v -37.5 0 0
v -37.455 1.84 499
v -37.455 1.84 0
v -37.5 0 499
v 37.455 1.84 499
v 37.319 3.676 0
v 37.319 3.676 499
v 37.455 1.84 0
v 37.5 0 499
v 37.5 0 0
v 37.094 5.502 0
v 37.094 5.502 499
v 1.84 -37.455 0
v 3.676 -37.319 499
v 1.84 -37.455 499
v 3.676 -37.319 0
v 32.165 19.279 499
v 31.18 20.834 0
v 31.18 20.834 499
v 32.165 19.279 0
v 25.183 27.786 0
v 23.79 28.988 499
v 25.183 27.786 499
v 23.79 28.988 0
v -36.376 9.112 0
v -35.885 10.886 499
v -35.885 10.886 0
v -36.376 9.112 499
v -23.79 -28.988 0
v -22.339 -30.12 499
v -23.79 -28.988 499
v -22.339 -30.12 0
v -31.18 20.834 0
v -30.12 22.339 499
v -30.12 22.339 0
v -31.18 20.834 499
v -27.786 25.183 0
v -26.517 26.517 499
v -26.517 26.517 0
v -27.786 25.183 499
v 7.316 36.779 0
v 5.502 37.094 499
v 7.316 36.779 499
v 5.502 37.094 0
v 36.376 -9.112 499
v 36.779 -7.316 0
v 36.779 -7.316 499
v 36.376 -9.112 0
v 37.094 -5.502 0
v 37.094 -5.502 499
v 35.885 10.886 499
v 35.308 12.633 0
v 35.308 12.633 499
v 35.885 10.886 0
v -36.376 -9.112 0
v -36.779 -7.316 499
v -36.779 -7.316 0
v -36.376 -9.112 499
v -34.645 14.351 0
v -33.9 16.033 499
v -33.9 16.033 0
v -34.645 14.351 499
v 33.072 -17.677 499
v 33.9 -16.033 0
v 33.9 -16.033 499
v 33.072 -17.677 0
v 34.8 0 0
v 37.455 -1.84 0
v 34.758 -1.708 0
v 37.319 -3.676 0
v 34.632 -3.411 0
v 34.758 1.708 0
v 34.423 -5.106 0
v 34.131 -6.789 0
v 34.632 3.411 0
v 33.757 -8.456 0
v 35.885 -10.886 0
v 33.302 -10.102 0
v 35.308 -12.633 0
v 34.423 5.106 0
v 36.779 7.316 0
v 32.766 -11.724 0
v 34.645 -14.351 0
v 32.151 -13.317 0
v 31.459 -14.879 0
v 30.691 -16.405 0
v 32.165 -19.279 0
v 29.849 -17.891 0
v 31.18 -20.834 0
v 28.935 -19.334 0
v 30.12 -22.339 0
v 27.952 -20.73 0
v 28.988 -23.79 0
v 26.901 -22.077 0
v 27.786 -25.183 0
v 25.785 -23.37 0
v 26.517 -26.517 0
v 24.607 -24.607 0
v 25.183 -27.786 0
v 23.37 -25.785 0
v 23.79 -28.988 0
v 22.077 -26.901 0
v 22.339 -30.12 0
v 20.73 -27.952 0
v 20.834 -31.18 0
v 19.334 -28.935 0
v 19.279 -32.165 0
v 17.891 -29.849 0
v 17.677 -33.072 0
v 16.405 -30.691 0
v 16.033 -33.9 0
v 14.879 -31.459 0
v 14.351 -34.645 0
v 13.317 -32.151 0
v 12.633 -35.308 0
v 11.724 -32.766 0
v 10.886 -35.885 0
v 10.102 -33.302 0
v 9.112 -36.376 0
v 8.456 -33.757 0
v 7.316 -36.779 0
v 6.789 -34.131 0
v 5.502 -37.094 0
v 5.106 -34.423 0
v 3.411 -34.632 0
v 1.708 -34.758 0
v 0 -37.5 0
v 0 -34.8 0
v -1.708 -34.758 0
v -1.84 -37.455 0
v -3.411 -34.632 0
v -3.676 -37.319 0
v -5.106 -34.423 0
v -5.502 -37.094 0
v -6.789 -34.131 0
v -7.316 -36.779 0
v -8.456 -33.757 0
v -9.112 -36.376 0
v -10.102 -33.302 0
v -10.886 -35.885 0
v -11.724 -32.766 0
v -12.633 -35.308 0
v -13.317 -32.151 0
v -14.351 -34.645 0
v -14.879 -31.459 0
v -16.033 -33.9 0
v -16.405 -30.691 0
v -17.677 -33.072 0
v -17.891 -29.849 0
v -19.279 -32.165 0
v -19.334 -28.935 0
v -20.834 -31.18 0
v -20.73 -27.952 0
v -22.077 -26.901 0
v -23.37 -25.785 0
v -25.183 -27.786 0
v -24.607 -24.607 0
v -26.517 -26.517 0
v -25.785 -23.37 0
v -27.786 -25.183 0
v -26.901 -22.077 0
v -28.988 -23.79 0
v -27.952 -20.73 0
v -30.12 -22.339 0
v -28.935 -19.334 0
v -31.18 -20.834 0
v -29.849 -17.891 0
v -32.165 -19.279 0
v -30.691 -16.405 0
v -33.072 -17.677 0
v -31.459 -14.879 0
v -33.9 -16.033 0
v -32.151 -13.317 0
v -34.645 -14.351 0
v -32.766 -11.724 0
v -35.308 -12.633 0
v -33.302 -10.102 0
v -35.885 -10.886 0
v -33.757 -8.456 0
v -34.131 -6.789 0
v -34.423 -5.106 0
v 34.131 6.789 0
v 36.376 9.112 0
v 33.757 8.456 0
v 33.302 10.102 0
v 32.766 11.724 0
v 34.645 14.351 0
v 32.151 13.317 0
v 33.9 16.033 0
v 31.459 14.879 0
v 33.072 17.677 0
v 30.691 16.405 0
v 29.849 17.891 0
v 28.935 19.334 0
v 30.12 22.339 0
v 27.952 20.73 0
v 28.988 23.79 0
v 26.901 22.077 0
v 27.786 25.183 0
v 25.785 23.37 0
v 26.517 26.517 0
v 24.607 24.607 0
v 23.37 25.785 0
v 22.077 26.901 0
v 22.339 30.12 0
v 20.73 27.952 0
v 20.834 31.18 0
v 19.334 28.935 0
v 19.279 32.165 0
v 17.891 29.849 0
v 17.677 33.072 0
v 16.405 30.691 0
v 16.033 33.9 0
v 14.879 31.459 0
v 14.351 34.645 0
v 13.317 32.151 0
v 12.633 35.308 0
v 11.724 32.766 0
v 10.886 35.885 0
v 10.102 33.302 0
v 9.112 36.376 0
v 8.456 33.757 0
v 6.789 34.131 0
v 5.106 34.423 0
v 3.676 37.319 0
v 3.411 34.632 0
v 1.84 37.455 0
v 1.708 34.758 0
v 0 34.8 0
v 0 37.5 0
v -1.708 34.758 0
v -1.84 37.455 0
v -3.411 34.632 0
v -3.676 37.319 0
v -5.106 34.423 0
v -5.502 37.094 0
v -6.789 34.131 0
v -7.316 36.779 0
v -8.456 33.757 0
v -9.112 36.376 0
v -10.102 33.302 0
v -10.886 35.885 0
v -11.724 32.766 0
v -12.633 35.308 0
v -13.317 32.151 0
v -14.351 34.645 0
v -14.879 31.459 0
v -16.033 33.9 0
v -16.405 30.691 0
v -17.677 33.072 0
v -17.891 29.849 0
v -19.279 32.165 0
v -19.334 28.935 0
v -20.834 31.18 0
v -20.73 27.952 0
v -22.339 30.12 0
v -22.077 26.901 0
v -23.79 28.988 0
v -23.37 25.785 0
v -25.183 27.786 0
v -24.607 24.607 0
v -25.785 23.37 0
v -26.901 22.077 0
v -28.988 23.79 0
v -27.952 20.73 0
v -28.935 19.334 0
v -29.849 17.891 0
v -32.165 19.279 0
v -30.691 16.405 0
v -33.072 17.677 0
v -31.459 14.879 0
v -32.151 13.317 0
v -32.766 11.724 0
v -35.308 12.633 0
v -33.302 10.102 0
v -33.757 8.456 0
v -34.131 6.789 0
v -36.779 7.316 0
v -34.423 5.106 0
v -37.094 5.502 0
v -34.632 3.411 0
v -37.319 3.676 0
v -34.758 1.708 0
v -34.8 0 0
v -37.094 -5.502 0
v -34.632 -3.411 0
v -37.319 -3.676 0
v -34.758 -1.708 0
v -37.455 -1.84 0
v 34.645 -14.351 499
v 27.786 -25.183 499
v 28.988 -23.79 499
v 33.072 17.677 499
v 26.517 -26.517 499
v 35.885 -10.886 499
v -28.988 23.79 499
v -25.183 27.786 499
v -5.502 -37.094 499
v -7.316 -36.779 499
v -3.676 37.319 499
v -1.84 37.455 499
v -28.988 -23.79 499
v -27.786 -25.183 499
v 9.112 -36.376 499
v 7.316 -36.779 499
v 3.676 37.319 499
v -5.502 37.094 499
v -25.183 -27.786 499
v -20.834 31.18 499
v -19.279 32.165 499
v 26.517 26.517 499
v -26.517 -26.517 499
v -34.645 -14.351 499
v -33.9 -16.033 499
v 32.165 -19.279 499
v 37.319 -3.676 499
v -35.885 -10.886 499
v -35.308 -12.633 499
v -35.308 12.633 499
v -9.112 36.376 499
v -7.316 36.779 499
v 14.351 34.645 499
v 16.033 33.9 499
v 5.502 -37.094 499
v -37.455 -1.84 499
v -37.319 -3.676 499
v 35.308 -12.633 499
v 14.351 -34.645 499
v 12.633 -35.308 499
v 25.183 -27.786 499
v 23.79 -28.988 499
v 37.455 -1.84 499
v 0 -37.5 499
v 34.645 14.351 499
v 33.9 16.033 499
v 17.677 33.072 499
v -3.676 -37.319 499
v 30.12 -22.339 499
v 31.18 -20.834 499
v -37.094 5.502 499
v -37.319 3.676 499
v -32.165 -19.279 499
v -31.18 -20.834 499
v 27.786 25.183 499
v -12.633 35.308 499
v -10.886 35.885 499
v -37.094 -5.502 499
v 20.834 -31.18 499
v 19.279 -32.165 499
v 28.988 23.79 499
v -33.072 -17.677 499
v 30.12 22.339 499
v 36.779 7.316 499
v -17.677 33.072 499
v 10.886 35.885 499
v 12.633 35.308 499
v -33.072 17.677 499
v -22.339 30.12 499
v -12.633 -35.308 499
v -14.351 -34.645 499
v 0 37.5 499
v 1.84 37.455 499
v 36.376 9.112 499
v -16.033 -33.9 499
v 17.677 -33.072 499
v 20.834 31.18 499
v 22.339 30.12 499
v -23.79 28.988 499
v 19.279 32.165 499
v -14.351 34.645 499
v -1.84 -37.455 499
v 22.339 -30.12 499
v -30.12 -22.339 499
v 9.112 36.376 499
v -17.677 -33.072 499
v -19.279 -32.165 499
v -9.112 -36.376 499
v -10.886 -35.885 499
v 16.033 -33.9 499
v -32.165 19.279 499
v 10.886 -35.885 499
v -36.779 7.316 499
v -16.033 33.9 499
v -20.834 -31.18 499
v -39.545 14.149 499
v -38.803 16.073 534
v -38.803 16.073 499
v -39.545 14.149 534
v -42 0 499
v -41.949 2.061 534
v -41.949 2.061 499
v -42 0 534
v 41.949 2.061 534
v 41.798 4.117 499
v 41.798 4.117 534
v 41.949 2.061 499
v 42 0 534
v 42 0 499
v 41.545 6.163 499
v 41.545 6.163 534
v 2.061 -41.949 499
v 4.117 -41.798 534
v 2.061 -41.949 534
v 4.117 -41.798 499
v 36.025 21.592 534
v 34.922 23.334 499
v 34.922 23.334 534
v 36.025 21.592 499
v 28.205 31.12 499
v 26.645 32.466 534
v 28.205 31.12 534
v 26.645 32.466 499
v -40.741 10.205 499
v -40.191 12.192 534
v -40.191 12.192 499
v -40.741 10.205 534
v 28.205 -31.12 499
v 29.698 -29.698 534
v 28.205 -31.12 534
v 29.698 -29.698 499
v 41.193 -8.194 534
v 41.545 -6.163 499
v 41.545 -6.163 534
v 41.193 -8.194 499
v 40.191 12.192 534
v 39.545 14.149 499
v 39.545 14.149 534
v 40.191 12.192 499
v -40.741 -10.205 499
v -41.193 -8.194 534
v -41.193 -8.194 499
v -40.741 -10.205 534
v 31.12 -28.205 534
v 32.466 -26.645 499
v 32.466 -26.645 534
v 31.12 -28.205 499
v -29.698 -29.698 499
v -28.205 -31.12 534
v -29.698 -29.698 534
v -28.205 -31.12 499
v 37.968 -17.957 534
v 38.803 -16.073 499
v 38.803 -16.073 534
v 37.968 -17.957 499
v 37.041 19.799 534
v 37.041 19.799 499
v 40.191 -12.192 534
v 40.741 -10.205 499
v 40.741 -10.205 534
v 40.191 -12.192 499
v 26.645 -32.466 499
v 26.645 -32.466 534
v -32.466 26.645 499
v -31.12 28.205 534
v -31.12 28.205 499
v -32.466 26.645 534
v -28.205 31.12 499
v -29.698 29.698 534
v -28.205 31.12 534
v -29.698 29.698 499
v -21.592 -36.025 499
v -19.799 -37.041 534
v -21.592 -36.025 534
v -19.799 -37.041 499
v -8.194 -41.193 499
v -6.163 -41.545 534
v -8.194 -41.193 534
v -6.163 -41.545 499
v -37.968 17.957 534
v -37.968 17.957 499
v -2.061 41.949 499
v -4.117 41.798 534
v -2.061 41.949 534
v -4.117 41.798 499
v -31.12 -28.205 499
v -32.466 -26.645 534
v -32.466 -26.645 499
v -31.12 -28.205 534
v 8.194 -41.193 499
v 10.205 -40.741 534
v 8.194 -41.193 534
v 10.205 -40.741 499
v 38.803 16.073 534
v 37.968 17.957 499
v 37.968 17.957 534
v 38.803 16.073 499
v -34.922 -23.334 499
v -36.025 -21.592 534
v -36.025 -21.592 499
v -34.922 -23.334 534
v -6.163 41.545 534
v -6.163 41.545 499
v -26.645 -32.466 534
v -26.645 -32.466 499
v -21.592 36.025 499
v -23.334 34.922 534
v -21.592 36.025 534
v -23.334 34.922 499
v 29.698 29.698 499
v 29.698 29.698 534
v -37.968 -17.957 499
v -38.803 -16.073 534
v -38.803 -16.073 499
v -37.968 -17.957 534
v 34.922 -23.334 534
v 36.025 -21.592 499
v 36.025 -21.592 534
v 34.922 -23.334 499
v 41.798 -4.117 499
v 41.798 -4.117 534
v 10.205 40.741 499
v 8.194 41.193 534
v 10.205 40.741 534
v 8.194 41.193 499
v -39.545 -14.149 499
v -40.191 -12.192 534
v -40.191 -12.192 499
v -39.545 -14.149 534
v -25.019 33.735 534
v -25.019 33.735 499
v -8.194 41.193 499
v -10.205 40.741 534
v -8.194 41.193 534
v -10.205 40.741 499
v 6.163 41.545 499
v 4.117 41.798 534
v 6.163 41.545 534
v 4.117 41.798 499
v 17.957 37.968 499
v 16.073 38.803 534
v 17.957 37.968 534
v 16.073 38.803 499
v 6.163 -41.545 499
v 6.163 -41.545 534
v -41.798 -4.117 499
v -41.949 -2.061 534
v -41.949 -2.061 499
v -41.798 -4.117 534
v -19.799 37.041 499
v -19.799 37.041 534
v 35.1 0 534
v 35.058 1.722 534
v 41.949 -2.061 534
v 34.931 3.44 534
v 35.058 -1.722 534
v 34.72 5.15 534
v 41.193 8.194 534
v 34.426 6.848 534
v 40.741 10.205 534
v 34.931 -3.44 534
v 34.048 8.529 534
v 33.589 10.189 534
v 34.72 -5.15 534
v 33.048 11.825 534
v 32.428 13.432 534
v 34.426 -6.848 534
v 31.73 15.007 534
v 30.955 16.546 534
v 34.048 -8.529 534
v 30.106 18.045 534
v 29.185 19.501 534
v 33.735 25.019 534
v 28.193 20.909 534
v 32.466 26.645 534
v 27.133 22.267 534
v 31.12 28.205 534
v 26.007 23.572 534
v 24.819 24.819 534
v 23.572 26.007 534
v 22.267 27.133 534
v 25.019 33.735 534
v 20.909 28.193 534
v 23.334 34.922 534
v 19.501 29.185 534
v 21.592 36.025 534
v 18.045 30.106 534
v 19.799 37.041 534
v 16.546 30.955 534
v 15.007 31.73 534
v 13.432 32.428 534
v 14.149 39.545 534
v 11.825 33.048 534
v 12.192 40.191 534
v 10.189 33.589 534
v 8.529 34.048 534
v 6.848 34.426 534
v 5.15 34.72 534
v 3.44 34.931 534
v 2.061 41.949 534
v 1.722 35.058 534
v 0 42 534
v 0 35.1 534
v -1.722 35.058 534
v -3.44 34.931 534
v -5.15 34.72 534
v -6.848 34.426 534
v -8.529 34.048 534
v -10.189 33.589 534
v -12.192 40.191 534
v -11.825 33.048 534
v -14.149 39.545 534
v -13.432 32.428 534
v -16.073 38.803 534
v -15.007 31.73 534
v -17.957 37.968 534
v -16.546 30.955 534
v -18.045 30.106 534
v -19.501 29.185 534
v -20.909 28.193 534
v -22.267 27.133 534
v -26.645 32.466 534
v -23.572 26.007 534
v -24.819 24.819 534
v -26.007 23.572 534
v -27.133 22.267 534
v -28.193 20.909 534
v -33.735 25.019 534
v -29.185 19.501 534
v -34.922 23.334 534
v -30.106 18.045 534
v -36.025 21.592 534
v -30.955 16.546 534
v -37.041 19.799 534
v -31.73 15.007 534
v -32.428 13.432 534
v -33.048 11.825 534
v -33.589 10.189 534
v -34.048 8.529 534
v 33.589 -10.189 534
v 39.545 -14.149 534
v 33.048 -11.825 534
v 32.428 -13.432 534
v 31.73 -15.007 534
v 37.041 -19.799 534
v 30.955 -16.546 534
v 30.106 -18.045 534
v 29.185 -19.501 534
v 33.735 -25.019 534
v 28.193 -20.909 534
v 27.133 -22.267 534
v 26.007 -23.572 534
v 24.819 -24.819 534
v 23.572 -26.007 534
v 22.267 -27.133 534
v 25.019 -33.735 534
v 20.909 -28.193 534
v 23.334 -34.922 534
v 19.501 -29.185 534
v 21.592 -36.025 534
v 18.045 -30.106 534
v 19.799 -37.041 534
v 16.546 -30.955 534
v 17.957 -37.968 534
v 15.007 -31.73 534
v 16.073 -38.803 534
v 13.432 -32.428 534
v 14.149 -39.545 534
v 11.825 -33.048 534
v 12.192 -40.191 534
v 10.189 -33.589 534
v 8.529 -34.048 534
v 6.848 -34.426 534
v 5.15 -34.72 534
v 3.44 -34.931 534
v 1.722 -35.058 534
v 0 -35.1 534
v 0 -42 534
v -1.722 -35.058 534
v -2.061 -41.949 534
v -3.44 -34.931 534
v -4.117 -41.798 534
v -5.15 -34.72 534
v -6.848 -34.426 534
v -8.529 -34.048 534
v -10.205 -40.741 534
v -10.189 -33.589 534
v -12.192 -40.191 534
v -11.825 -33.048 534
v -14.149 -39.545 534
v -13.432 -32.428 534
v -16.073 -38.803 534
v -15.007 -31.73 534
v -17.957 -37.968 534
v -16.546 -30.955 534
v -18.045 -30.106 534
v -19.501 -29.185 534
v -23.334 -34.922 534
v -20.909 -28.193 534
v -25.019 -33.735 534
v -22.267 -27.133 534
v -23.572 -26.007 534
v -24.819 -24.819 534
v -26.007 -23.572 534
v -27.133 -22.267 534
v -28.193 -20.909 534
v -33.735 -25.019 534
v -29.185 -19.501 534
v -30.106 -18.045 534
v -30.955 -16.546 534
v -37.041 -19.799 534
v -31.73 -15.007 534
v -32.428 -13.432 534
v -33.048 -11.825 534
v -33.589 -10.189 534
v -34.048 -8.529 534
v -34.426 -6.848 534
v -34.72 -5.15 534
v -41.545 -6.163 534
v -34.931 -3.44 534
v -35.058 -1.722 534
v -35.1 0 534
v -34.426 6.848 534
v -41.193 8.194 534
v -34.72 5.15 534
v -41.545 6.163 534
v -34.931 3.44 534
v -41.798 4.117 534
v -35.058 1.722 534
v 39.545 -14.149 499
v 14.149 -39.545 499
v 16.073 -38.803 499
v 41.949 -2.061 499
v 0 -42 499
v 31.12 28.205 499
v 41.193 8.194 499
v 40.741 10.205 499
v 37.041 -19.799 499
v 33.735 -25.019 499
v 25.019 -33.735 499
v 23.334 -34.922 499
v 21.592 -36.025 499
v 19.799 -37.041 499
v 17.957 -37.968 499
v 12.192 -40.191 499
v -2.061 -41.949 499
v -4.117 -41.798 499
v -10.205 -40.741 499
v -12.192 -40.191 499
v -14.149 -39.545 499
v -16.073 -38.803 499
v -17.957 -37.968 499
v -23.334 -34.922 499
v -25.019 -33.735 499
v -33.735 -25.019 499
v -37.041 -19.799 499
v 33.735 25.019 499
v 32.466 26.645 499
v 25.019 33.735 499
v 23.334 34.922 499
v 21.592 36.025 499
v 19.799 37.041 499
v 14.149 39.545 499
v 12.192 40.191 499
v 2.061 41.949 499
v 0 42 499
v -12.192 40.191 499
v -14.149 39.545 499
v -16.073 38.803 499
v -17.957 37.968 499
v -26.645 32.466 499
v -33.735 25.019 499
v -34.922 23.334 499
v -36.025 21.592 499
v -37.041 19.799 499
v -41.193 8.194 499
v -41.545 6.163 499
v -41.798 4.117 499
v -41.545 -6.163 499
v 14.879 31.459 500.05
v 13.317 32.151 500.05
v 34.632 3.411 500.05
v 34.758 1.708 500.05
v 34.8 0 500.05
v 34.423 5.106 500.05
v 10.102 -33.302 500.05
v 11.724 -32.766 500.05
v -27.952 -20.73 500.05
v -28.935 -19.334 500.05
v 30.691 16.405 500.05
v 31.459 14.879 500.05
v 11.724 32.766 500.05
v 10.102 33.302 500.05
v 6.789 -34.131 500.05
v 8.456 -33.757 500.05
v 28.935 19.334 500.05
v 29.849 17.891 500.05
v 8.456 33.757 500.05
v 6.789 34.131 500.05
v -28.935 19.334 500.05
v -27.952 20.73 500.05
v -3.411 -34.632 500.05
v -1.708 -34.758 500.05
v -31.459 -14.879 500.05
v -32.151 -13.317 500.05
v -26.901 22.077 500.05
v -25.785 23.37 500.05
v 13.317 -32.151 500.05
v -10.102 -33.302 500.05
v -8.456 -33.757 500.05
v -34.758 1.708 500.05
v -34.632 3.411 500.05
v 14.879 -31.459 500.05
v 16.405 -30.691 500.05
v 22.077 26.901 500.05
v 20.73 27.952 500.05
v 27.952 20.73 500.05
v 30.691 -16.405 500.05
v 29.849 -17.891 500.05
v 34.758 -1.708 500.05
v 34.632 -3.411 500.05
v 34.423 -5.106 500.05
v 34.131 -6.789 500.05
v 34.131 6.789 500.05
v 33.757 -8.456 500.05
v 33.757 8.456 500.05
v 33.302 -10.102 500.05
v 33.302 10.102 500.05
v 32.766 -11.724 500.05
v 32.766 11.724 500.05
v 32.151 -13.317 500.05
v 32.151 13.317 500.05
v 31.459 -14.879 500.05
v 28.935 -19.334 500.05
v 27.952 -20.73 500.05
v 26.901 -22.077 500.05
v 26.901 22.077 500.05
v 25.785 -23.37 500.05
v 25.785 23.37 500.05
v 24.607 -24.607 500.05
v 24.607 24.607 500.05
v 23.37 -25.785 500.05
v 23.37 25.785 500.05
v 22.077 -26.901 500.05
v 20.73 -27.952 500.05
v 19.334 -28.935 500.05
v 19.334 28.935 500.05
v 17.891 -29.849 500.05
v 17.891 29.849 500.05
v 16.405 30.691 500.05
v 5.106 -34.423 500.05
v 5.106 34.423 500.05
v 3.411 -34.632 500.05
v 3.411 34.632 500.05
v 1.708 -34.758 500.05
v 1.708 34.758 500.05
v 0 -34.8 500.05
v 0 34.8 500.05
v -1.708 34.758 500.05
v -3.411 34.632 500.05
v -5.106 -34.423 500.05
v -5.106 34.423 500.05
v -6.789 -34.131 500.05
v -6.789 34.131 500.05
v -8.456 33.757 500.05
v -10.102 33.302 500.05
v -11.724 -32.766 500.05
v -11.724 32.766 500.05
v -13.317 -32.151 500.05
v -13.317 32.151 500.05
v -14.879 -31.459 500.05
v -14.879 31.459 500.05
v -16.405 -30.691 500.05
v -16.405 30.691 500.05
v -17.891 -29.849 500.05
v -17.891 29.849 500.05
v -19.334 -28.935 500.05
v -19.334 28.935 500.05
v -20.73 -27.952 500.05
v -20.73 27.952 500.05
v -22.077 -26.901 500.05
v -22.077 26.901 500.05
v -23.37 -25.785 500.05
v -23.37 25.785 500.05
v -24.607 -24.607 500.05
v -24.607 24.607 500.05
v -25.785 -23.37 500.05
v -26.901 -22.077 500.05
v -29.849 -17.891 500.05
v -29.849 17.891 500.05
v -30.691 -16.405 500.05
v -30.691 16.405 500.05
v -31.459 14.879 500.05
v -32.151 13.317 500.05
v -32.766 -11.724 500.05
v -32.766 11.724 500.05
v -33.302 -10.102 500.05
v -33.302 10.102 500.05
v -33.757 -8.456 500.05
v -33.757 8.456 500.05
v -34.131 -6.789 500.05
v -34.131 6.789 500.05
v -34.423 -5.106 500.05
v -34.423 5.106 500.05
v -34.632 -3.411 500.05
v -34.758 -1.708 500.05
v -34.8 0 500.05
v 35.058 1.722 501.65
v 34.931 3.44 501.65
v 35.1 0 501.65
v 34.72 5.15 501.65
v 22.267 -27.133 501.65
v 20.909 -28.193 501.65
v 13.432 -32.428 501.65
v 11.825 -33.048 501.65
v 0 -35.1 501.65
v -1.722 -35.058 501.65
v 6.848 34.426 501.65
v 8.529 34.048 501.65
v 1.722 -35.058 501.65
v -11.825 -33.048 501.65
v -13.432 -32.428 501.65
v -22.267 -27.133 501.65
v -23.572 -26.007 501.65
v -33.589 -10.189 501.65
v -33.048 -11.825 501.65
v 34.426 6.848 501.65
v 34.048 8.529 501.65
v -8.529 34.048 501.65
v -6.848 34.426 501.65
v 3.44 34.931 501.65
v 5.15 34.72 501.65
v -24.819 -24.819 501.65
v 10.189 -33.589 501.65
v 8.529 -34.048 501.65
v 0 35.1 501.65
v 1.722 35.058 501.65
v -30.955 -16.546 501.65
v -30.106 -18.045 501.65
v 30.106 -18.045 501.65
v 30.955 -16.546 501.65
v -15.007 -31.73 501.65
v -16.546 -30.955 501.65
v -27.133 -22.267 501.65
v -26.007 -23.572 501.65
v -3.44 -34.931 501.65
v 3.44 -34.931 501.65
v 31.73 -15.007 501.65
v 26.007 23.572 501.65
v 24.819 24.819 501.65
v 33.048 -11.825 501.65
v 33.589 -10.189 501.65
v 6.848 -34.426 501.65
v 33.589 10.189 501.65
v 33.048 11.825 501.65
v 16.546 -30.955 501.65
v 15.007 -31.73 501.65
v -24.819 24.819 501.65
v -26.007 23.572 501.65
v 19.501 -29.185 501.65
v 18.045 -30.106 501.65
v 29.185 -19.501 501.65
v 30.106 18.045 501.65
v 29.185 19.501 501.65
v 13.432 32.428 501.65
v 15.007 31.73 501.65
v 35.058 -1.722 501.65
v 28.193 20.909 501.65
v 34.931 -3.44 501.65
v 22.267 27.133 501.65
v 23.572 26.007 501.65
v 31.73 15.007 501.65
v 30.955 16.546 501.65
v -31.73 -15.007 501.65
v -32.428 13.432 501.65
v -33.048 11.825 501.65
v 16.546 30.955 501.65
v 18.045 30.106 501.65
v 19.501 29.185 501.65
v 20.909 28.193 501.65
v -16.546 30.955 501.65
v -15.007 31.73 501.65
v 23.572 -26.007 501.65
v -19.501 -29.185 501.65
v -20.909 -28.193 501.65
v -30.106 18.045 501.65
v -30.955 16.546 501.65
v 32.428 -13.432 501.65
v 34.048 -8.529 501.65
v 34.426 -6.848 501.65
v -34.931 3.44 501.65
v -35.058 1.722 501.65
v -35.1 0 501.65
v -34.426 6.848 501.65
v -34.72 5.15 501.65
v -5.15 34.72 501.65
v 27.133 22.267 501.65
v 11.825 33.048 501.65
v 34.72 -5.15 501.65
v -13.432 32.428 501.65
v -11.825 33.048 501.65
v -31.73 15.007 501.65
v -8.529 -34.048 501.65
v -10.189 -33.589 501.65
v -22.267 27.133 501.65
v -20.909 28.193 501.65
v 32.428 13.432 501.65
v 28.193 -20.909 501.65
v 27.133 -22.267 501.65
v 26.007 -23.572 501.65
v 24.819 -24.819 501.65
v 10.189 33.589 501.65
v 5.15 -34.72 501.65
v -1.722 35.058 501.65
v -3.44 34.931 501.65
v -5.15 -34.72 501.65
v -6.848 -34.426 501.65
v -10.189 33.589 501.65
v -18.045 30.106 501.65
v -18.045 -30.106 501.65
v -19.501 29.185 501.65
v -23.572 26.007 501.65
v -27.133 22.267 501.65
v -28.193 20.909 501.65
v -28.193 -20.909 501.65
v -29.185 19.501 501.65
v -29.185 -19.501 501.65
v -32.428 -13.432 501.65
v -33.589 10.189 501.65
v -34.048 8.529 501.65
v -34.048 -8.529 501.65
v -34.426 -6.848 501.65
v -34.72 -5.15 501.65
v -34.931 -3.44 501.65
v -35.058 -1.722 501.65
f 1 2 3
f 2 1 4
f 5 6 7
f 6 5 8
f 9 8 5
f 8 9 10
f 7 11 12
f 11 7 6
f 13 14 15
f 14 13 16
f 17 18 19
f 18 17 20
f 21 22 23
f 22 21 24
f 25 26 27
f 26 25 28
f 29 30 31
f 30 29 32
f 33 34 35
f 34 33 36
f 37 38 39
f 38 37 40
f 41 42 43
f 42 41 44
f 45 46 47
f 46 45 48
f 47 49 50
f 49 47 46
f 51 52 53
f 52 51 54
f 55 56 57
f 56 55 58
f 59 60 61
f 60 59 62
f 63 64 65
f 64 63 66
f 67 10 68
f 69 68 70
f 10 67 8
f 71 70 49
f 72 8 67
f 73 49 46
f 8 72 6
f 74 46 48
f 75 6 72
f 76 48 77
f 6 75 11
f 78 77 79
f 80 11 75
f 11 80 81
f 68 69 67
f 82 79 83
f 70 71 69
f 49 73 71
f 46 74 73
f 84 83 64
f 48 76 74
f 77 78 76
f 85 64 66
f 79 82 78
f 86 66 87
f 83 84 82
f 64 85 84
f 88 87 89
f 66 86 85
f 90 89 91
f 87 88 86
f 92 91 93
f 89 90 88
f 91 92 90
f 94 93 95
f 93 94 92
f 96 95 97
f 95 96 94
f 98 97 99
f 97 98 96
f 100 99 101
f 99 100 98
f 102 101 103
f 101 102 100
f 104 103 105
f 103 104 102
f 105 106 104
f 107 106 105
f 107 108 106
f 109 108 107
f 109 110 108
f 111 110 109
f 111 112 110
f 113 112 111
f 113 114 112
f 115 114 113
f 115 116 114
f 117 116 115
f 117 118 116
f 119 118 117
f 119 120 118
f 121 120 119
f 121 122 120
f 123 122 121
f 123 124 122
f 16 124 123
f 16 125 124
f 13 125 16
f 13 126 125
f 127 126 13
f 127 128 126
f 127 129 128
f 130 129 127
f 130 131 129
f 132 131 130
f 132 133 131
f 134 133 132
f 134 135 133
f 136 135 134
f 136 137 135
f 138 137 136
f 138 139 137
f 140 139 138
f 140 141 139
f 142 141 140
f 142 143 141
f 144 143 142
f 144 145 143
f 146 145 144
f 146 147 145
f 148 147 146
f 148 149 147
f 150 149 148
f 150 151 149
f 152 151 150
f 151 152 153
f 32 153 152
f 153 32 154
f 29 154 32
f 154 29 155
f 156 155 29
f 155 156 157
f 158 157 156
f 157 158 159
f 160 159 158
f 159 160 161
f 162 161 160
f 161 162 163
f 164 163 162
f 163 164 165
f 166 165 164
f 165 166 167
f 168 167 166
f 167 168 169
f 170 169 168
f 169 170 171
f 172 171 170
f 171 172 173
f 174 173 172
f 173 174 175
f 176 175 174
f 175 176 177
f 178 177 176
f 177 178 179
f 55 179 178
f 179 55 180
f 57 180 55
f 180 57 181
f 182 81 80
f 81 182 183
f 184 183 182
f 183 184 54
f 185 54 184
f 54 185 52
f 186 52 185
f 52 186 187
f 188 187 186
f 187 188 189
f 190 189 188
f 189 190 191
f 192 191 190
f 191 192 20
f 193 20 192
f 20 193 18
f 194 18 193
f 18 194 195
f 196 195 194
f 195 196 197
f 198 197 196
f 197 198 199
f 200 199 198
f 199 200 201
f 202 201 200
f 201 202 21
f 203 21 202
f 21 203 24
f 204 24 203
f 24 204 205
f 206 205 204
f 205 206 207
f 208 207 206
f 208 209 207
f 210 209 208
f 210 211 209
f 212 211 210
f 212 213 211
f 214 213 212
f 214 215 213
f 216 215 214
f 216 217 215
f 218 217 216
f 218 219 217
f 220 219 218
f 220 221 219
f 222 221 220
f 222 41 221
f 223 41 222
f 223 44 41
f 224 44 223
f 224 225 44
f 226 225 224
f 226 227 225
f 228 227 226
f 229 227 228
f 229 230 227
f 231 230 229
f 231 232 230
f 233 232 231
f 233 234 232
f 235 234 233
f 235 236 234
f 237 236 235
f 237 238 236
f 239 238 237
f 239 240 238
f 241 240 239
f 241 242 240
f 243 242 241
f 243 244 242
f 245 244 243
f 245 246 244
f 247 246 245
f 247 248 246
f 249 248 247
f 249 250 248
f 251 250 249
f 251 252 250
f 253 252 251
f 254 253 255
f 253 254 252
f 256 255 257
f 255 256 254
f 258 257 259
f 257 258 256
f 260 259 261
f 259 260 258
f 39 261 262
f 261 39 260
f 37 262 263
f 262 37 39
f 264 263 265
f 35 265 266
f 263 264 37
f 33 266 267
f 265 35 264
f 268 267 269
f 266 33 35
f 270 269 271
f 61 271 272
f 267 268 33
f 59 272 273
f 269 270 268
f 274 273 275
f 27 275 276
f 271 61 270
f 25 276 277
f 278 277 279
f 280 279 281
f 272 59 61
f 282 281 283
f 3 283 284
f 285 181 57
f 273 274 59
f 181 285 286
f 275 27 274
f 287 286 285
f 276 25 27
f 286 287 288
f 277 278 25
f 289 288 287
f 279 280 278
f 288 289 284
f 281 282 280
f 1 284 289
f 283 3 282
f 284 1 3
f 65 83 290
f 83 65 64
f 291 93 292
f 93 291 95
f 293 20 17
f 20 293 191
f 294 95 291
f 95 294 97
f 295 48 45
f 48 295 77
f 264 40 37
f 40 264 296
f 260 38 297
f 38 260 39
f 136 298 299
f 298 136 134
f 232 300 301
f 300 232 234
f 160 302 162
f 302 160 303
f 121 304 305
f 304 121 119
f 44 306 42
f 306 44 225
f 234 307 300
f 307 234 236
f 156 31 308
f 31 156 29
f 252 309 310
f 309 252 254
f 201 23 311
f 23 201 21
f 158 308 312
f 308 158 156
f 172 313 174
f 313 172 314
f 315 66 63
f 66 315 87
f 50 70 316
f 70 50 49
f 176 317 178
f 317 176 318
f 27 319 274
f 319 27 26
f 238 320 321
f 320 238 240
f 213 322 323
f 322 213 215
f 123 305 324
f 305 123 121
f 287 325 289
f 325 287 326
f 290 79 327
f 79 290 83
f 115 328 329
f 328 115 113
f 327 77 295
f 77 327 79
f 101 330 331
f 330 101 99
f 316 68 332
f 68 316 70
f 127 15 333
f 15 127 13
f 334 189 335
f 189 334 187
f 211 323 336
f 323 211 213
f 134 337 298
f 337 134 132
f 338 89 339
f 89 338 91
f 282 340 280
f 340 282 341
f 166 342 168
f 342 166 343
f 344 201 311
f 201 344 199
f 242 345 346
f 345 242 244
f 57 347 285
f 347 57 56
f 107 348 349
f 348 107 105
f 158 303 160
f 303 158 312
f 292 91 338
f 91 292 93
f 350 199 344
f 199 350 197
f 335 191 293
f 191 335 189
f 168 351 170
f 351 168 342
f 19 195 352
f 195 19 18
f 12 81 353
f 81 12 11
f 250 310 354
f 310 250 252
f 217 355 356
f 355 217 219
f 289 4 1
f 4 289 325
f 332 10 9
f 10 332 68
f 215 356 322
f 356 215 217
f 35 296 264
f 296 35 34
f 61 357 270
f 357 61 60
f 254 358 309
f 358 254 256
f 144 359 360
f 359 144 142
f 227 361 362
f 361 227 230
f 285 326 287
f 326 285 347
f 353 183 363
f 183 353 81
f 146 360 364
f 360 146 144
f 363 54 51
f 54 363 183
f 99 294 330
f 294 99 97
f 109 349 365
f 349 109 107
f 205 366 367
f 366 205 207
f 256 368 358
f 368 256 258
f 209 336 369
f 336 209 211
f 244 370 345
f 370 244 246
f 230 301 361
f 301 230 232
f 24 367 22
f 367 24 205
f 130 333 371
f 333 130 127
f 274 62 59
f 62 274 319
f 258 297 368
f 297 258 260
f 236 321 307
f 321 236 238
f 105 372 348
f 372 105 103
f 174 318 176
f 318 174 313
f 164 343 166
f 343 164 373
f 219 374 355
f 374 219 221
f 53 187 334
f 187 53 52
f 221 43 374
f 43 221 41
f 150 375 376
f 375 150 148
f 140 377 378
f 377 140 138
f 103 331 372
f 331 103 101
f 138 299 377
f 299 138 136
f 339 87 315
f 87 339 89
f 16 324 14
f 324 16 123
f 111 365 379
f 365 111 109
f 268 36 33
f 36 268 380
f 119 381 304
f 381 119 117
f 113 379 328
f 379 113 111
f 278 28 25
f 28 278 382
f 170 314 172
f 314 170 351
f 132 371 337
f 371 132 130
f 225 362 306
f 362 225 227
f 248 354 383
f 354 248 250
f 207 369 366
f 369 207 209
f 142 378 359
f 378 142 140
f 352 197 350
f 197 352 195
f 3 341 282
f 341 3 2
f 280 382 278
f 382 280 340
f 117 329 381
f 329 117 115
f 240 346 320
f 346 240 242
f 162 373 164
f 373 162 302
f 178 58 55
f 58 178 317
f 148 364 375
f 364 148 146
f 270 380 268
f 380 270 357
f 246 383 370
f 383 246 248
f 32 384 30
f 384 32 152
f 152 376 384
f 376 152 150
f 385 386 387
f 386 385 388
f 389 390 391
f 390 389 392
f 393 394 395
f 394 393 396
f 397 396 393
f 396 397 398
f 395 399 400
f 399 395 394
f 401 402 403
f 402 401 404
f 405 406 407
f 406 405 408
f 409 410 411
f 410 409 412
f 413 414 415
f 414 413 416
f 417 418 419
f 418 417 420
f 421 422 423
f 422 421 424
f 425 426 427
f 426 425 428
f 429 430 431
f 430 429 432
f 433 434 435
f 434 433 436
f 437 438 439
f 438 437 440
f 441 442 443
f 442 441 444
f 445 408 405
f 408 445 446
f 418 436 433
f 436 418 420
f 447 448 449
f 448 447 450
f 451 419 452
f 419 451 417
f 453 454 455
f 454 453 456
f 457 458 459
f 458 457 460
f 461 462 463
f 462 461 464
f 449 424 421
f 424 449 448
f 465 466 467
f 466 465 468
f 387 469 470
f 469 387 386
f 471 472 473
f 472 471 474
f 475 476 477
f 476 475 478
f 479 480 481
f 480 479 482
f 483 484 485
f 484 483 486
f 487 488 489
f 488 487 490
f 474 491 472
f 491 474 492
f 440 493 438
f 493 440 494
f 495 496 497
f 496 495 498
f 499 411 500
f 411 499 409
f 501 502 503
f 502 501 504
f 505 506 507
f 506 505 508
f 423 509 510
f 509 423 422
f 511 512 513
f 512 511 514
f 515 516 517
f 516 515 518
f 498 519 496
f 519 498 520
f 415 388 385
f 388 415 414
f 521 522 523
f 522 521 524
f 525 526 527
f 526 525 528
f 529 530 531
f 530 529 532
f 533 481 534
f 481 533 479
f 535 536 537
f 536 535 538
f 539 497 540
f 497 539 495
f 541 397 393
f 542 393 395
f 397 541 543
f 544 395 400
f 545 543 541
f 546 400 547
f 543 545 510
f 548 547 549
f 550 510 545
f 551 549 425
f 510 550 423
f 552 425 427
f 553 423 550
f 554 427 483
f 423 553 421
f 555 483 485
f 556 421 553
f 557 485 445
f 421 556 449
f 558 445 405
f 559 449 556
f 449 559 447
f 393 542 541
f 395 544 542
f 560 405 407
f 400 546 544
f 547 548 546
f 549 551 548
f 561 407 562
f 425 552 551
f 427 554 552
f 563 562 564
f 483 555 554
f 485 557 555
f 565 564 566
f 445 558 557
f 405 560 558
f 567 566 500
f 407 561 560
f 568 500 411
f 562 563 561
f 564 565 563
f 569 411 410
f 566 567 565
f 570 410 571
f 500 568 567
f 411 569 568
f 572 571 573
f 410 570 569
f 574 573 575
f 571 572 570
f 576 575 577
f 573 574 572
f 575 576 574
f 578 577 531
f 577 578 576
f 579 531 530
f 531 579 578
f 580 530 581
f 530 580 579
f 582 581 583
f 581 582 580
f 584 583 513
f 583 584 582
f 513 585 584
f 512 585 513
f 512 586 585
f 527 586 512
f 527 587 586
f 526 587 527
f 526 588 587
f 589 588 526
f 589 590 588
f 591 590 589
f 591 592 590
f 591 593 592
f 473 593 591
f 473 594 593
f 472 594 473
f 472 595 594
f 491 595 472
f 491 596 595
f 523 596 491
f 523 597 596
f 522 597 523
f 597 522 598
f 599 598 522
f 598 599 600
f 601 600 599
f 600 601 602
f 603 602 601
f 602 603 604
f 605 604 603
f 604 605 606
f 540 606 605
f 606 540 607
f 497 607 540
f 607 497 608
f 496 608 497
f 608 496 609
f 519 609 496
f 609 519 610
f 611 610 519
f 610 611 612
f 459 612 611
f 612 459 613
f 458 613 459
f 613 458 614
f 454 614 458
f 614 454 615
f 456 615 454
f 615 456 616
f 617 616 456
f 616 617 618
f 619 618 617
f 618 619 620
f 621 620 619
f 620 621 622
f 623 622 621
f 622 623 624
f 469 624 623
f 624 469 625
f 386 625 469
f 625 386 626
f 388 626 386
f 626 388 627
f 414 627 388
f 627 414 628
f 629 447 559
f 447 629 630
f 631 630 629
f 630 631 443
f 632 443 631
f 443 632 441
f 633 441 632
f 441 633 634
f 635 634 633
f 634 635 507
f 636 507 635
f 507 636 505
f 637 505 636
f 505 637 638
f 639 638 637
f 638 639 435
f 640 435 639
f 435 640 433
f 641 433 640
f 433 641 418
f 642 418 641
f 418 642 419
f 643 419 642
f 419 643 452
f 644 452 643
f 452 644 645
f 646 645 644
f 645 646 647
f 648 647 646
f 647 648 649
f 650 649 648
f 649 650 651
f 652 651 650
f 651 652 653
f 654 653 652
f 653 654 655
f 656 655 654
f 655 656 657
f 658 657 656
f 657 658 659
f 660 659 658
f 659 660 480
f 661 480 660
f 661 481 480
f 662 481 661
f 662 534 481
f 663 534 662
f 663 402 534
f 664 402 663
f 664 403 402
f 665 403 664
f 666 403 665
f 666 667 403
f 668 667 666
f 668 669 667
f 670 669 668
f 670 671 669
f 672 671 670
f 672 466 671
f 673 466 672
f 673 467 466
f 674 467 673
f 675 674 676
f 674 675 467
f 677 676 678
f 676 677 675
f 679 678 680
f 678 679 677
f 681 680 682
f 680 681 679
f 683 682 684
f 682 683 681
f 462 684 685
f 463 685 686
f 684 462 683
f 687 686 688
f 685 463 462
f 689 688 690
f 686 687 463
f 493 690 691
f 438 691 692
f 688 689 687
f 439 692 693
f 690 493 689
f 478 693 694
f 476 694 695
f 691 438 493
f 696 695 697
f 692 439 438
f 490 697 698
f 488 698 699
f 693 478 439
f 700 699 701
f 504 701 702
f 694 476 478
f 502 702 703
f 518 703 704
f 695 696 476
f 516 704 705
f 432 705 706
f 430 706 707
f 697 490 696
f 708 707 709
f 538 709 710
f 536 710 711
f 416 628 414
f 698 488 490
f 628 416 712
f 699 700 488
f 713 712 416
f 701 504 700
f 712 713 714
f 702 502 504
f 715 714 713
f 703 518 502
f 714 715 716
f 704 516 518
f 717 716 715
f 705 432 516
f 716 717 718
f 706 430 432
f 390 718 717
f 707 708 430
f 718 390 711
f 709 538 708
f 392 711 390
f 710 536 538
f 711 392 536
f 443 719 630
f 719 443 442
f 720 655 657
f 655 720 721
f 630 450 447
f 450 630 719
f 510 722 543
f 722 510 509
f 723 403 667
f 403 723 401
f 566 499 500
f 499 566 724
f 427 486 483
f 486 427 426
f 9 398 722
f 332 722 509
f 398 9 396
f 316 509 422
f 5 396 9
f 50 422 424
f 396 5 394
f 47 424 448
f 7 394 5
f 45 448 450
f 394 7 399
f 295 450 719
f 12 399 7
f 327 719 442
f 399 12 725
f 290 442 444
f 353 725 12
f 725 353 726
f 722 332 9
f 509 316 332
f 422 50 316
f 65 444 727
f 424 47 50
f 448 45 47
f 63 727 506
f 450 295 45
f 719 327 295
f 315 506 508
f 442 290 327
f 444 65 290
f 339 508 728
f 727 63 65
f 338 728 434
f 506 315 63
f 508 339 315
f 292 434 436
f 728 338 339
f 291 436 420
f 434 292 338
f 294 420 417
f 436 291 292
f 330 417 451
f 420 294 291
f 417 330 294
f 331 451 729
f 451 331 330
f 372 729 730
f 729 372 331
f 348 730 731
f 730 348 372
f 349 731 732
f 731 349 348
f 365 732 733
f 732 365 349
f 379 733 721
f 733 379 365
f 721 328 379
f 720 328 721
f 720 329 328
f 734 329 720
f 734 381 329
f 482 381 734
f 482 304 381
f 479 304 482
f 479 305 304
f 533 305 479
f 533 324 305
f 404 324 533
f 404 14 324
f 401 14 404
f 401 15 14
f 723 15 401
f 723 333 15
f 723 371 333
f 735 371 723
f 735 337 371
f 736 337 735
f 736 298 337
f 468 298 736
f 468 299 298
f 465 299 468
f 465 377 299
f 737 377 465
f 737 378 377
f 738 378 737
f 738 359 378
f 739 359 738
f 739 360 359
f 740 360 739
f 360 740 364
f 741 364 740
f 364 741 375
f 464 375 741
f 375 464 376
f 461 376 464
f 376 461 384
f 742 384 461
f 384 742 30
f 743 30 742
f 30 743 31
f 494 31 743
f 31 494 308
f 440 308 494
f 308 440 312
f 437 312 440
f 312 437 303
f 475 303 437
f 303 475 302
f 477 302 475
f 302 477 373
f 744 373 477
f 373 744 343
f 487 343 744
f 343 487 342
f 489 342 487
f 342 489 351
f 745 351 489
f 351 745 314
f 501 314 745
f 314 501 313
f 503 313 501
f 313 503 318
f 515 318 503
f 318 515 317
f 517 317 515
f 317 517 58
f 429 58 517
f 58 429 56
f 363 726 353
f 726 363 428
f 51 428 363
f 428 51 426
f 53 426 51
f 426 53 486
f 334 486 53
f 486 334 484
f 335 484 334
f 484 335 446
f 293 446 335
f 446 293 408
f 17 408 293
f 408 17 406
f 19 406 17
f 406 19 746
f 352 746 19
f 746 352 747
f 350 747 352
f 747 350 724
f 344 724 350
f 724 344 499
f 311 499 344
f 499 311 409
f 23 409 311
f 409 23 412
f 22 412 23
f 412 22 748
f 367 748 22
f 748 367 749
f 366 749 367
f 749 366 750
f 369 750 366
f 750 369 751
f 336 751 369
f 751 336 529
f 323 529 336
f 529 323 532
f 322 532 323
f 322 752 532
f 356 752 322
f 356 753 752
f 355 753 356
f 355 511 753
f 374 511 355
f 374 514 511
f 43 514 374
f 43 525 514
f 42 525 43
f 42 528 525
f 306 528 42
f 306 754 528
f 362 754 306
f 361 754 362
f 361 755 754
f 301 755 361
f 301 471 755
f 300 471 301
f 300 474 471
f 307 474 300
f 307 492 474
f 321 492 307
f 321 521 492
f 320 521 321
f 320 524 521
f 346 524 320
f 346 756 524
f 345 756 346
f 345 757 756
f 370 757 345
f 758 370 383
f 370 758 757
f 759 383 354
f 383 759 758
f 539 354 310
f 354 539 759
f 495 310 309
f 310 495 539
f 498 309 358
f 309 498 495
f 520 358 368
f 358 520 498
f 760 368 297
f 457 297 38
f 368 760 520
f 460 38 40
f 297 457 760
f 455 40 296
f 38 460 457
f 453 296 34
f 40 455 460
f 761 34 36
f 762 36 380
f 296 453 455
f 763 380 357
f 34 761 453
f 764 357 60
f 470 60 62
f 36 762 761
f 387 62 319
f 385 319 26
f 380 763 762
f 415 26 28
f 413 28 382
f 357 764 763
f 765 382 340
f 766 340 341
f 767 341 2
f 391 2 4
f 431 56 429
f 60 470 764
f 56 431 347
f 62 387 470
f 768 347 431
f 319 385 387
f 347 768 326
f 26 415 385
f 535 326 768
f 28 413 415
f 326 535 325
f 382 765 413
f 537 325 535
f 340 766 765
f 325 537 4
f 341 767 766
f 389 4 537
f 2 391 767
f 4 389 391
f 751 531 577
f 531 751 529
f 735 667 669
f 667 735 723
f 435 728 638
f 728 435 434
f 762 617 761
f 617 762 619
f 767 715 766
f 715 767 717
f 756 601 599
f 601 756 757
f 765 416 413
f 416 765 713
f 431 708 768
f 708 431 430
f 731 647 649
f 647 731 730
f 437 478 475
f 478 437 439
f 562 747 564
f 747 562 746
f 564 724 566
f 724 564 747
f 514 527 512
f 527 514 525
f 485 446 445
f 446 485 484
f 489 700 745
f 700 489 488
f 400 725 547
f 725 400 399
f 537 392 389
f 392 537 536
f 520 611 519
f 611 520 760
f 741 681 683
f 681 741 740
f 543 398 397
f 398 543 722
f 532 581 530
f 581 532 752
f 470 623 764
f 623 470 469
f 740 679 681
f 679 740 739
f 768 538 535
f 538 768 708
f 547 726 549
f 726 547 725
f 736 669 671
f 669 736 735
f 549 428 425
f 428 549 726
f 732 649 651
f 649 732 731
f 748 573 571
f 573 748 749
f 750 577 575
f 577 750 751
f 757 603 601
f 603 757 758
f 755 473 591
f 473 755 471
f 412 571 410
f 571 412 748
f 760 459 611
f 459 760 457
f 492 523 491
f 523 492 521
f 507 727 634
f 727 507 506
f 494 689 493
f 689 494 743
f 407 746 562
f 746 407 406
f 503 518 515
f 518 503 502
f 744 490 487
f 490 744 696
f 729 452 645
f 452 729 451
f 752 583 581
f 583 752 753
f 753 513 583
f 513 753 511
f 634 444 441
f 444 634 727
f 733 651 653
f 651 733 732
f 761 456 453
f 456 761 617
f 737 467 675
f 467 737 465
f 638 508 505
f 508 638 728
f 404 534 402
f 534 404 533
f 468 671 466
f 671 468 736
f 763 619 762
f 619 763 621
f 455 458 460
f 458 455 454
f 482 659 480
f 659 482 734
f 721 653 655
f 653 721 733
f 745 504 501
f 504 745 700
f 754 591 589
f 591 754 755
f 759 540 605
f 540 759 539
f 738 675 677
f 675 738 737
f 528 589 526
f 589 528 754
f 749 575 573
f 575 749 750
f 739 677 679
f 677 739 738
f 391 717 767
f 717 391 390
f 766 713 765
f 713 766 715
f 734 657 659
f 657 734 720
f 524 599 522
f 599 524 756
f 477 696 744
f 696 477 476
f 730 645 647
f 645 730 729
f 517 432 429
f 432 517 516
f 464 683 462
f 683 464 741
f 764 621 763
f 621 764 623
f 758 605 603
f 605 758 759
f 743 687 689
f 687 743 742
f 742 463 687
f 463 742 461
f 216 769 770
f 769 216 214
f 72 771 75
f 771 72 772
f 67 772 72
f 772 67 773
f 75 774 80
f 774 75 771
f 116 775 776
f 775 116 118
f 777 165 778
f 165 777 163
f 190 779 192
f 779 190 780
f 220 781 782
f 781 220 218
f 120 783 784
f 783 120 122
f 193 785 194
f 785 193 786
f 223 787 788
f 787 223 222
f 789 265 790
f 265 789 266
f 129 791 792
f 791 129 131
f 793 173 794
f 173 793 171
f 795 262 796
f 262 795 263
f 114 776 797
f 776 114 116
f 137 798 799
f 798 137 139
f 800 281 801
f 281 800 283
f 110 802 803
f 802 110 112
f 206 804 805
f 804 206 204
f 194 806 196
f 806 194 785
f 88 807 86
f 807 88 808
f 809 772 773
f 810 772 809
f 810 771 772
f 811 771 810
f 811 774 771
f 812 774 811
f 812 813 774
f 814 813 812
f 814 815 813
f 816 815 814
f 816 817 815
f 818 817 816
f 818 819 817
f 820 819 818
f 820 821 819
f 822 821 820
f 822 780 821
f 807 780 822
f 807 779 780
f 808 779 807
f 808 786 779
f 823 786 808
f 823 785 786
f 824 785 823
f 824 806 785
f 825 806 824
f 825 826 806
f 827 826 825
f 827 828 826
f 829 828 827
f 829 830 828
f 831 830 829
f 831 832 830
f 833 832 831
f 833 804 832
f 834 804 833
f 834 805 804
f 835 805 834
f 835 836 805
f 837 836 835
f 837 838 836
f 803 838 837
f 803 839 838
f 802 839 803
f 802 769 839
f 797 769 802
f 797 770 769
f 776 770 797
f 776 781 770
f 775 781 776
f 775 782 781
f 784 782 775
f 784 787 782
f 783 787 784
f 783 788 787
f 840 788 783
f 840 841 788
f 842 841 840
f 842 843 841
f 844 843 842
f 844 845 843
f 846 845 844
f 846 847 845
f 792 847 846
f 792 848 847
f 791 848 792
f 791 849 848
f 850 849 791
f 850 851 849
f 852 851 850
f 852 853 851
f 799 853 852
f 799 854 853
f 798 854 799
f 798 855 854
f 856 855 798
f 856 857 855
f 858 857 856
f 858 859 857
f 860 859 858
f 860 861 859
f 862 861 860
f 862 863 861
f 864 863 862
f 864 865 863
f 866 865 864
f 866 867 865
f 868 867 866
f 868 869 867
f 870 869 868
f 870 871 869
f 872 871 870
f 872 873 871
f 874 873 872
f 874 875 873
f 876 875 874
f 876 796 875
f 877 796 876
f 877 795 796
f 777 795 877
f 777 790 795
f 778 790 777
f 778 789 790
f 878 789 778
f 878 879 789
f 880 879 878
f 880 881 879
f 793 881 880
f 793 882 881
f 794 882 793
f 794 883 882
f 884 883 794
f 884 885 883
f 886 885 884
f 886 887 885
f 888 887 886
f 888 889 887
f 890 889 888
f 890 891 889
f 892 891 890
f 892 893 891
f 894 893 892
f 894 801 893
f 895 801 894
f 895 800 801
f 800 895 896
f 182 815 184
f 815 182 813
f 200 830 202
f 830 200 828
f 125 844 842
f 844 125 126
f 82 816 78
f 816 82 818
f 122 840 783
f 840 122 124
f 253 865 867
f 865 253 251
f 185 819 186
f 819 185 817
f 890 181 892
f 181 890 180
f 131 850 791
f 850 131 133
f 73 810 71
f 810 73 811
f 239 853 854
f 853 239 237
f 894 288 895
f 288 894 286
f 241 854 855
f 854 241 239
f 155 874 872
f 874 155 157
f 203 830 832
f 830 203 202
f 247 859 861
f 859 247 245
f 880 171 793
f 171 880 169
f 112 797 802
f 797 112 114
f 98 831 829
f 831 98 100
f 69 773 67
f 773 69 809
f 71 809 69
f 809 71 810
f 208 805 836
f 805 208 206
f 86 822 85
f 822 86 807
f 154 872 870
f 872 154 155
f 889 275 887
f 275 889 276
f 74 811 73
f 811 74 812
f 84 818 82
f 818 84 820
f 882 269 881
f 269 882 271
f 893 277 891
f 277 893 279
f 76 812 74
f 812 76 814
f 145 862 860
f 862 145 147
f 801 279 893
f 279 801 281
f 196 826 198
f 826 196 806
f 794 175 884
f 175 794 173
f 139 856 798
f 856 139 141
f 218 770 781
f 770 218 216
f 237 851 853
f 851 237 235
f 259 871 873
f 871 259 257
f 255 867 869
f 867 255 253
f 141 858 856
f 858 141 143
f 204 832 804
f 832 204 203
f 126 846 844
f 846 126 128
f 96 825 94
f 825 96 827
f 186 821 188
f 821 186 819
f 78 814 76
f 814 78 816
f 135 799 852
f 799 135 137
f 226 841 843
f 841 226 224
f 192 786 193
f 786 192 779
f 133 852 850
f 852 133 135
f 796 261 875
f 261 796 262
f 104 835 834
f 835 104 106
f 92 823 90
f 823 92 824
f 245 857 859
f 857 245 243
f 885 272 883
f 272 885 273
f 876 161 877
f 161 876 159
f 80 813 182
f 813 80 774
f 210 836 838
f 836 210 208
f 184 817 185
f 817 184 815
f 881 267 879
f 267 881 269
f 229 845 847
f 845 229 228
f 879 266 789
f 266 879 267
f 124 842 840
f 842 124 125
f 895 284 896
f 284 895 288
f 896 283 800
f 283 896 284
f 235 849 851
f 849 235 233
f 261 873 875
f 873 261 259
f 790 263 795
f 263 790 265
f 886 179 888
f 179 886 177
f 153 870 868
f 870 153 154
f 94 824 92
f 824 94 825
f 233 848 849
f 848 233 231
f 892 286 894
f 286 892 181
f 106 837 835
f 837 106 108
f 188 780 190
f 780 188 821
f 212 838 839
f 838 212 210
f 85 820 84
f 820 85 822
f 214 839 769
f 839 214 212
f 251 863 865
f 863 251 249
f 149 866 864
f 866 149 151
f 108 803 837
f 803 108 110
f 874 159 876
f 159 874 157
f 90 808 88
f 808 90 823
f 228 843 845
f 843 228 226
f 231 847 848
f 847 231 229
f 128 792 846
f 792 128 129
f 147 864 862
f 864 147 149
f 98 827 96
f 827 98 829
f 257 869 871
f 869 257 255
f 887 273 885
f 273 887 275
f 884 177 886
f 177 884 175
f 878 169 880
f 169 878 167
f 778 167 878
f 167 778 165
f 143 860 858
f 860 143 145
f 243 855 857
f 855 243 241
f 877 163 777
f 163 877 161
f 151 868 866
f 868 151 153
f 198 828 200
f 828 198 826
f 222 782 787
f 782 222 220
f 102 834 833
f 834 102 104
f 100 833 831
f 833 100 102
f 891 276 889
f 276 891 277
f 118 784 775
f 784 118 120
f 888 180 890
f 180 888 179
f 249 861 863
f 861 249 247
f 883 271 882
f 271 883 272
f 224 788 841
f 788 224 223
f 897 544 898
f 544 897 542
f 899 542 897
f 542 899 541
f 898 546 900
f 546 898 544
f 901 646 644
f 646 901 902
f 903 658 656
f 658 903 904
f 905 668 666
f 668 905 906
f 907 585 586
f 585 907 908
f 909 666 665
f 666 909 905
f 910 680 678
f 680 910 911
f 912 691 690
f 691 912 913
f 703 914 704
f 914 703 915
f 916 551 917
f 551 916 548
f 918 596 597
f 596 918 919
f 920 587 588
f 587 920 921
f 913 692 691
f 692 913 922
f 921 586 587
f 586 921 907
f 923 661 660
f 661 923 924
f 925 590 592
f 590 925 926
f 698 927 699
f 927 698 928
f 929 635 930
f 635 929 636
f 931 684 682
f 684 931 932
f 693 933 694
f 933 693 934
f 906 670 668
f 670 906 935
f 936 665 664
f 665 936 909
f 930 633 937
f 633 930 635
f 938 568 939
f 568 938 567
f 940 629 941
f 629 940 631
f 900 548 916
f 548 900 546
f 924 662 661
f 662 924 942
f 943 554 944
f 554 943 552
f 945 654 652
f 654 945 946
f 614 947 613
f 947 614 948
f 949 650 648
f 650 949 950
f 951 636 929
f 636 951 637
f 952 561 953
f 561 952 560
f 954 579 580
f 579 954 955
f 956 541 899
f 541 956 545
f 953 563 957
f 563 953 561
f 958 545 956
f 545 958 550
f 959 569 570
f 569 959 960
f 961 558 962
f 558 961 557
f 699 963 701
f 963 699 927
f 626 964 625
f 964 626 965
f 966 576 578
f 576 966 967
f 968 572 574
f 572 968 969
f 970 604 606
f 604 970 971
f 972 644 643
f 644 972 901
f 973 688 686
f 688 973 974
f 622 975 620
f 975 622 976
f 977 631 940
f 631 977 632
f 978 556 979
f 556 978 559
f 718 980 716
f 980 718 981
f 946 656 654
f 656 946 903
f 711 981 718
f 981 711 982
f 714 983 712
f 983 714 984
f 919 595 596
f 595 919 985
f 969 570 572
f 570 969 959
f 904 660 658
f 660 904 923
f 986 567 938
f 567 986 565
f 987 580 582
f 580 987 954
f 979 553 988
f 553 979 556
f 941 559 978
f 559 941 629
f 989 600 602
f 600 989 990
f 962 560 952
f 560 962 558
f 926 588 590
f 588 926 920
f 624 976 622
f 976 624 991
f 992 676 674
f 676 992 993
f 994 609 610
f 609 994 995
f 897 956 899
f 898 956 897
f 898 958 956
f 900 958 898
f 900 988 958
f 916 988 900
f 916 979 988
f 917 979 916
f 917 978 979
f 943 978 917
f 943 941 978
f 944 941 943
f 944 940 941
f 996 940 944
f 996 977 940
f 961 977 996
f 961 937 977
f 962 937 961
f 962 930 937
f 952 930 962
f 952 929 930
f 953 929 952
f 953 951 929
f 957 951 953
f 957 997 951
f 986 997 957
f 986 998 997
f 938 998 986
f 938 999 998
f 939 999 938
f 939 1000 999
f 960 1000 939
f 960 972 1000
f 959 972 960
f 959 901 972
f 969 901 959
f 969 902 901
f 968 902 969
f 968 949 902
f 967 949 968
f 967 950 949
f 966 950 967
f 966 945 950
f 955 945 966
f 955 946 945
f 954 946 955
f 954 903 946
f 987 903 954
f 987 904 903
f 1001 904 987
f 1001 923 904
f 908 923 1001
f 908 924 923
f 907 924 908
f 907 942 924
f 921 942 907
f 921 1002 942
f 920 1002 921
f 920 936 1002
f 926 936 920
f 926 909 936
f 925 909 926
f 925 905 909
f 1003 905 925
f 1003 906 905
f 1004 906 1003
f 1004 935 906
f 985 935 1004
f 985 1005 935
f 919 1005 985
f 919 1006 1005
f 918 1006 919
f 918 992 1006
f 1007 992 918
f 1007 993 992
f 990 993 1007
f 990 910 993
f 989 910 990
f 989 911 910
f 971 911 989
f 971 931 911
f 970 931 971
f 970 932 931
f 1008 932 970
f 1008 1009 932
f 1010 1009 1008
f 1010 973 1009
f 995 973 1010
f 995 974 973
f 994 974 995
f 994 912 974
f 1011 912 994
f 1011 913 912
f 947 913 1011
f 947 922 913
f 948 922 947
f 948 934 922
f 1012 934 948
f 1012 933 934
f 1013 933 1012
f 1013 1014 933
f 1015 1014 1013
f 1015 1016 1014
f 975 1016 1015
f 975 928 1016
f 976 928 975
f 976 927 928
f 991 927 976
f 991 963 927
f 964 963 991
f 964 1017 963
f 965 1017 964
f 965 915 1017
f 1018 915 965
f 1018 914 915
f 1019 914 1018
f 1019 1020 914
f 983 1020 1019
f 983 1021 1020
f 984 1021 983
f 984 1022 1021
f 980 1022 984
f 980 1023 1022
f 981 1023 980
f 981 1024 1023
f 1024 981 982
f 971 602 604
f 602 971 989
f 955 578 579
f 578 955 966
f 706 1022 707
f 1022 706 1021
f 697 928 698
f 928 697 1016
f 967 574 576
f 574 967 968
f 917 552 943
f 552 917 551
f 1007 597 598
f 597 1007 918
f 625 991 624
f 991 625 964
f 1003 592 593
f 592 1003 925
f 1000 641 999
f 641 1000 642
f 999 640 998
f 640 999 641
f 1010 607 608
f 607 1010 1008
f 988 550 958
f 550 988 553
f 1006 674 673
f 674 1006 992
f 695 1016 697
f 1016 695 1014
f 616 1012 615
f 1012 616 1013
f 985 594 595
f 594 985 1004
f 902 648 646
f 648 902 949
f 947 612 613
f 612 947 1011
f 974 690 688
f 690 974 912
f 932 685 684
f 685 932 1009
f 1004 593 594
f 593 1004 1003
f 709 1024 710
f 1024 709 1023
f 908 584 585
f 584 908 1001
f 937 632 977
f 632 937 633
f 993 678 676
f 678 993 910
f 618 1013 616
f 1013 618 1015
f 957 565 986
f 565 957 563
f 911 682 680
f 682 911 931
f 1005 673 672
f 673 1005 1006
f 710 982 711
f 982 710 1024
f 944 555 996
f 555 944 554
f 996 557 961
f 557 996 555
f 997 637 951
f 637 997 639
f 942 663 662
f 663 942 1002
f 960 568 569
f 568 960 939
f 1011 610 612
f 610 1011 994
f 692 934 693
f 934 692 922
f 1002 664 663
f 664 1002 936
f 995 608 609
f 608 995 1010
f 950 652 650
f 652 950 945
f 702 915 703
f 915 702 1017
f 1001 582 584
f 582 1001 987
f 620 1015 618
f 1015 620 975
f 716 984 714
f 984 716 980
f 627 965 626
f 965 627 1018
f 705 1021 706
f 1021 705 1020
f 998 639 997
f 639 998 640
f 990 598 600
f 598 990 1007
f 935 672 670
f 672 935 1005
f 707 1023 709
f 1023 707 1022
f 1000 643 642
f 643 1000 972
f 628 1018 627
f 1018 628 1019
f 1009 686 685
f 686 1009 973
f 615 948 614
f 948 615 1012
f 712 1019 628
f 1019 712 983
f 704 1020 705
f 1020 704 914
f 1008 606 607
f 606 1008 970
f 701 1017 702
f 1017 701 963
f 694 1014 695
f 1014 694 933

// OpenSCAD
// Parameters
nominal_size = 75; //[40:160:1]
length_mm = 500; //[250:1000:1]
pipe_od = 75; //[60:110:0.5]
pipe_wall = 2.7; //[1.5:5.5:0.1]
fitting_length = 35; //[20:70:1]
fitting_od_scale = 1.12; //[1.02:1.3:0.01]
fitting_bore_clearance = 0.3; //[0.0:1.0:0.05]
connect_overlap = 1; //[0.5:2:0.1]

$fn = 128;

module ht_pipe() {
    pipe_r = pipe_od/2;
    fit_r  = (pipe_od * fitting_od_scale)/2;

    // Inner radii
    pipe_ir = max(0.01, pipe_r - pipe_wall);
    fit_ir  = max(0.01, pipe_ir + fitting_bore_clearance);

    // Ensure overlap is valid and fitting exists
    ov = min(connect_overlap, fitting_length - 0.01);
    z_fit0 = length_mm - ov;          // fitting starts overlapping into pipe
    z_fit1 = z_fit0 + fitting_length; // fitting end

    // Robust boolean epsilon to avoid coplanar/empty results
    eps = 0.05;

    color([0.85, 0.85, 0.8])
    difference() {
        // OUTER solid (one connected body)
        union() {
            cylinder(h=length_mm, r=pipe_r, center=false);
            translate([0, 0, z_fit0])
                cylinder(h=fitting_length, r=fit_r, center=false);
        }

        // INNER void (continuous bore; slightly extended to guarantee clean subtraction)
        union() {
            // Main pipe bore (open both ends)
            translate([0, 0, -eps])
                cylinder(h=length_mm + 2*eps, r=pipe_ir, center=false);

            // Socket bore: leave a closed ring at the very end of the socket
            // (starts at z_fit0 + pipe_wall, ends at z_fit1)
            translate([0, 0, z_fit0 + pipe_wall - eps])
                cylinder(h=max(0.01, fitting_length - pipe_wall) + 2*eps, r=fit_ir, center=false);
        }
    }
}

ht_pipe();
